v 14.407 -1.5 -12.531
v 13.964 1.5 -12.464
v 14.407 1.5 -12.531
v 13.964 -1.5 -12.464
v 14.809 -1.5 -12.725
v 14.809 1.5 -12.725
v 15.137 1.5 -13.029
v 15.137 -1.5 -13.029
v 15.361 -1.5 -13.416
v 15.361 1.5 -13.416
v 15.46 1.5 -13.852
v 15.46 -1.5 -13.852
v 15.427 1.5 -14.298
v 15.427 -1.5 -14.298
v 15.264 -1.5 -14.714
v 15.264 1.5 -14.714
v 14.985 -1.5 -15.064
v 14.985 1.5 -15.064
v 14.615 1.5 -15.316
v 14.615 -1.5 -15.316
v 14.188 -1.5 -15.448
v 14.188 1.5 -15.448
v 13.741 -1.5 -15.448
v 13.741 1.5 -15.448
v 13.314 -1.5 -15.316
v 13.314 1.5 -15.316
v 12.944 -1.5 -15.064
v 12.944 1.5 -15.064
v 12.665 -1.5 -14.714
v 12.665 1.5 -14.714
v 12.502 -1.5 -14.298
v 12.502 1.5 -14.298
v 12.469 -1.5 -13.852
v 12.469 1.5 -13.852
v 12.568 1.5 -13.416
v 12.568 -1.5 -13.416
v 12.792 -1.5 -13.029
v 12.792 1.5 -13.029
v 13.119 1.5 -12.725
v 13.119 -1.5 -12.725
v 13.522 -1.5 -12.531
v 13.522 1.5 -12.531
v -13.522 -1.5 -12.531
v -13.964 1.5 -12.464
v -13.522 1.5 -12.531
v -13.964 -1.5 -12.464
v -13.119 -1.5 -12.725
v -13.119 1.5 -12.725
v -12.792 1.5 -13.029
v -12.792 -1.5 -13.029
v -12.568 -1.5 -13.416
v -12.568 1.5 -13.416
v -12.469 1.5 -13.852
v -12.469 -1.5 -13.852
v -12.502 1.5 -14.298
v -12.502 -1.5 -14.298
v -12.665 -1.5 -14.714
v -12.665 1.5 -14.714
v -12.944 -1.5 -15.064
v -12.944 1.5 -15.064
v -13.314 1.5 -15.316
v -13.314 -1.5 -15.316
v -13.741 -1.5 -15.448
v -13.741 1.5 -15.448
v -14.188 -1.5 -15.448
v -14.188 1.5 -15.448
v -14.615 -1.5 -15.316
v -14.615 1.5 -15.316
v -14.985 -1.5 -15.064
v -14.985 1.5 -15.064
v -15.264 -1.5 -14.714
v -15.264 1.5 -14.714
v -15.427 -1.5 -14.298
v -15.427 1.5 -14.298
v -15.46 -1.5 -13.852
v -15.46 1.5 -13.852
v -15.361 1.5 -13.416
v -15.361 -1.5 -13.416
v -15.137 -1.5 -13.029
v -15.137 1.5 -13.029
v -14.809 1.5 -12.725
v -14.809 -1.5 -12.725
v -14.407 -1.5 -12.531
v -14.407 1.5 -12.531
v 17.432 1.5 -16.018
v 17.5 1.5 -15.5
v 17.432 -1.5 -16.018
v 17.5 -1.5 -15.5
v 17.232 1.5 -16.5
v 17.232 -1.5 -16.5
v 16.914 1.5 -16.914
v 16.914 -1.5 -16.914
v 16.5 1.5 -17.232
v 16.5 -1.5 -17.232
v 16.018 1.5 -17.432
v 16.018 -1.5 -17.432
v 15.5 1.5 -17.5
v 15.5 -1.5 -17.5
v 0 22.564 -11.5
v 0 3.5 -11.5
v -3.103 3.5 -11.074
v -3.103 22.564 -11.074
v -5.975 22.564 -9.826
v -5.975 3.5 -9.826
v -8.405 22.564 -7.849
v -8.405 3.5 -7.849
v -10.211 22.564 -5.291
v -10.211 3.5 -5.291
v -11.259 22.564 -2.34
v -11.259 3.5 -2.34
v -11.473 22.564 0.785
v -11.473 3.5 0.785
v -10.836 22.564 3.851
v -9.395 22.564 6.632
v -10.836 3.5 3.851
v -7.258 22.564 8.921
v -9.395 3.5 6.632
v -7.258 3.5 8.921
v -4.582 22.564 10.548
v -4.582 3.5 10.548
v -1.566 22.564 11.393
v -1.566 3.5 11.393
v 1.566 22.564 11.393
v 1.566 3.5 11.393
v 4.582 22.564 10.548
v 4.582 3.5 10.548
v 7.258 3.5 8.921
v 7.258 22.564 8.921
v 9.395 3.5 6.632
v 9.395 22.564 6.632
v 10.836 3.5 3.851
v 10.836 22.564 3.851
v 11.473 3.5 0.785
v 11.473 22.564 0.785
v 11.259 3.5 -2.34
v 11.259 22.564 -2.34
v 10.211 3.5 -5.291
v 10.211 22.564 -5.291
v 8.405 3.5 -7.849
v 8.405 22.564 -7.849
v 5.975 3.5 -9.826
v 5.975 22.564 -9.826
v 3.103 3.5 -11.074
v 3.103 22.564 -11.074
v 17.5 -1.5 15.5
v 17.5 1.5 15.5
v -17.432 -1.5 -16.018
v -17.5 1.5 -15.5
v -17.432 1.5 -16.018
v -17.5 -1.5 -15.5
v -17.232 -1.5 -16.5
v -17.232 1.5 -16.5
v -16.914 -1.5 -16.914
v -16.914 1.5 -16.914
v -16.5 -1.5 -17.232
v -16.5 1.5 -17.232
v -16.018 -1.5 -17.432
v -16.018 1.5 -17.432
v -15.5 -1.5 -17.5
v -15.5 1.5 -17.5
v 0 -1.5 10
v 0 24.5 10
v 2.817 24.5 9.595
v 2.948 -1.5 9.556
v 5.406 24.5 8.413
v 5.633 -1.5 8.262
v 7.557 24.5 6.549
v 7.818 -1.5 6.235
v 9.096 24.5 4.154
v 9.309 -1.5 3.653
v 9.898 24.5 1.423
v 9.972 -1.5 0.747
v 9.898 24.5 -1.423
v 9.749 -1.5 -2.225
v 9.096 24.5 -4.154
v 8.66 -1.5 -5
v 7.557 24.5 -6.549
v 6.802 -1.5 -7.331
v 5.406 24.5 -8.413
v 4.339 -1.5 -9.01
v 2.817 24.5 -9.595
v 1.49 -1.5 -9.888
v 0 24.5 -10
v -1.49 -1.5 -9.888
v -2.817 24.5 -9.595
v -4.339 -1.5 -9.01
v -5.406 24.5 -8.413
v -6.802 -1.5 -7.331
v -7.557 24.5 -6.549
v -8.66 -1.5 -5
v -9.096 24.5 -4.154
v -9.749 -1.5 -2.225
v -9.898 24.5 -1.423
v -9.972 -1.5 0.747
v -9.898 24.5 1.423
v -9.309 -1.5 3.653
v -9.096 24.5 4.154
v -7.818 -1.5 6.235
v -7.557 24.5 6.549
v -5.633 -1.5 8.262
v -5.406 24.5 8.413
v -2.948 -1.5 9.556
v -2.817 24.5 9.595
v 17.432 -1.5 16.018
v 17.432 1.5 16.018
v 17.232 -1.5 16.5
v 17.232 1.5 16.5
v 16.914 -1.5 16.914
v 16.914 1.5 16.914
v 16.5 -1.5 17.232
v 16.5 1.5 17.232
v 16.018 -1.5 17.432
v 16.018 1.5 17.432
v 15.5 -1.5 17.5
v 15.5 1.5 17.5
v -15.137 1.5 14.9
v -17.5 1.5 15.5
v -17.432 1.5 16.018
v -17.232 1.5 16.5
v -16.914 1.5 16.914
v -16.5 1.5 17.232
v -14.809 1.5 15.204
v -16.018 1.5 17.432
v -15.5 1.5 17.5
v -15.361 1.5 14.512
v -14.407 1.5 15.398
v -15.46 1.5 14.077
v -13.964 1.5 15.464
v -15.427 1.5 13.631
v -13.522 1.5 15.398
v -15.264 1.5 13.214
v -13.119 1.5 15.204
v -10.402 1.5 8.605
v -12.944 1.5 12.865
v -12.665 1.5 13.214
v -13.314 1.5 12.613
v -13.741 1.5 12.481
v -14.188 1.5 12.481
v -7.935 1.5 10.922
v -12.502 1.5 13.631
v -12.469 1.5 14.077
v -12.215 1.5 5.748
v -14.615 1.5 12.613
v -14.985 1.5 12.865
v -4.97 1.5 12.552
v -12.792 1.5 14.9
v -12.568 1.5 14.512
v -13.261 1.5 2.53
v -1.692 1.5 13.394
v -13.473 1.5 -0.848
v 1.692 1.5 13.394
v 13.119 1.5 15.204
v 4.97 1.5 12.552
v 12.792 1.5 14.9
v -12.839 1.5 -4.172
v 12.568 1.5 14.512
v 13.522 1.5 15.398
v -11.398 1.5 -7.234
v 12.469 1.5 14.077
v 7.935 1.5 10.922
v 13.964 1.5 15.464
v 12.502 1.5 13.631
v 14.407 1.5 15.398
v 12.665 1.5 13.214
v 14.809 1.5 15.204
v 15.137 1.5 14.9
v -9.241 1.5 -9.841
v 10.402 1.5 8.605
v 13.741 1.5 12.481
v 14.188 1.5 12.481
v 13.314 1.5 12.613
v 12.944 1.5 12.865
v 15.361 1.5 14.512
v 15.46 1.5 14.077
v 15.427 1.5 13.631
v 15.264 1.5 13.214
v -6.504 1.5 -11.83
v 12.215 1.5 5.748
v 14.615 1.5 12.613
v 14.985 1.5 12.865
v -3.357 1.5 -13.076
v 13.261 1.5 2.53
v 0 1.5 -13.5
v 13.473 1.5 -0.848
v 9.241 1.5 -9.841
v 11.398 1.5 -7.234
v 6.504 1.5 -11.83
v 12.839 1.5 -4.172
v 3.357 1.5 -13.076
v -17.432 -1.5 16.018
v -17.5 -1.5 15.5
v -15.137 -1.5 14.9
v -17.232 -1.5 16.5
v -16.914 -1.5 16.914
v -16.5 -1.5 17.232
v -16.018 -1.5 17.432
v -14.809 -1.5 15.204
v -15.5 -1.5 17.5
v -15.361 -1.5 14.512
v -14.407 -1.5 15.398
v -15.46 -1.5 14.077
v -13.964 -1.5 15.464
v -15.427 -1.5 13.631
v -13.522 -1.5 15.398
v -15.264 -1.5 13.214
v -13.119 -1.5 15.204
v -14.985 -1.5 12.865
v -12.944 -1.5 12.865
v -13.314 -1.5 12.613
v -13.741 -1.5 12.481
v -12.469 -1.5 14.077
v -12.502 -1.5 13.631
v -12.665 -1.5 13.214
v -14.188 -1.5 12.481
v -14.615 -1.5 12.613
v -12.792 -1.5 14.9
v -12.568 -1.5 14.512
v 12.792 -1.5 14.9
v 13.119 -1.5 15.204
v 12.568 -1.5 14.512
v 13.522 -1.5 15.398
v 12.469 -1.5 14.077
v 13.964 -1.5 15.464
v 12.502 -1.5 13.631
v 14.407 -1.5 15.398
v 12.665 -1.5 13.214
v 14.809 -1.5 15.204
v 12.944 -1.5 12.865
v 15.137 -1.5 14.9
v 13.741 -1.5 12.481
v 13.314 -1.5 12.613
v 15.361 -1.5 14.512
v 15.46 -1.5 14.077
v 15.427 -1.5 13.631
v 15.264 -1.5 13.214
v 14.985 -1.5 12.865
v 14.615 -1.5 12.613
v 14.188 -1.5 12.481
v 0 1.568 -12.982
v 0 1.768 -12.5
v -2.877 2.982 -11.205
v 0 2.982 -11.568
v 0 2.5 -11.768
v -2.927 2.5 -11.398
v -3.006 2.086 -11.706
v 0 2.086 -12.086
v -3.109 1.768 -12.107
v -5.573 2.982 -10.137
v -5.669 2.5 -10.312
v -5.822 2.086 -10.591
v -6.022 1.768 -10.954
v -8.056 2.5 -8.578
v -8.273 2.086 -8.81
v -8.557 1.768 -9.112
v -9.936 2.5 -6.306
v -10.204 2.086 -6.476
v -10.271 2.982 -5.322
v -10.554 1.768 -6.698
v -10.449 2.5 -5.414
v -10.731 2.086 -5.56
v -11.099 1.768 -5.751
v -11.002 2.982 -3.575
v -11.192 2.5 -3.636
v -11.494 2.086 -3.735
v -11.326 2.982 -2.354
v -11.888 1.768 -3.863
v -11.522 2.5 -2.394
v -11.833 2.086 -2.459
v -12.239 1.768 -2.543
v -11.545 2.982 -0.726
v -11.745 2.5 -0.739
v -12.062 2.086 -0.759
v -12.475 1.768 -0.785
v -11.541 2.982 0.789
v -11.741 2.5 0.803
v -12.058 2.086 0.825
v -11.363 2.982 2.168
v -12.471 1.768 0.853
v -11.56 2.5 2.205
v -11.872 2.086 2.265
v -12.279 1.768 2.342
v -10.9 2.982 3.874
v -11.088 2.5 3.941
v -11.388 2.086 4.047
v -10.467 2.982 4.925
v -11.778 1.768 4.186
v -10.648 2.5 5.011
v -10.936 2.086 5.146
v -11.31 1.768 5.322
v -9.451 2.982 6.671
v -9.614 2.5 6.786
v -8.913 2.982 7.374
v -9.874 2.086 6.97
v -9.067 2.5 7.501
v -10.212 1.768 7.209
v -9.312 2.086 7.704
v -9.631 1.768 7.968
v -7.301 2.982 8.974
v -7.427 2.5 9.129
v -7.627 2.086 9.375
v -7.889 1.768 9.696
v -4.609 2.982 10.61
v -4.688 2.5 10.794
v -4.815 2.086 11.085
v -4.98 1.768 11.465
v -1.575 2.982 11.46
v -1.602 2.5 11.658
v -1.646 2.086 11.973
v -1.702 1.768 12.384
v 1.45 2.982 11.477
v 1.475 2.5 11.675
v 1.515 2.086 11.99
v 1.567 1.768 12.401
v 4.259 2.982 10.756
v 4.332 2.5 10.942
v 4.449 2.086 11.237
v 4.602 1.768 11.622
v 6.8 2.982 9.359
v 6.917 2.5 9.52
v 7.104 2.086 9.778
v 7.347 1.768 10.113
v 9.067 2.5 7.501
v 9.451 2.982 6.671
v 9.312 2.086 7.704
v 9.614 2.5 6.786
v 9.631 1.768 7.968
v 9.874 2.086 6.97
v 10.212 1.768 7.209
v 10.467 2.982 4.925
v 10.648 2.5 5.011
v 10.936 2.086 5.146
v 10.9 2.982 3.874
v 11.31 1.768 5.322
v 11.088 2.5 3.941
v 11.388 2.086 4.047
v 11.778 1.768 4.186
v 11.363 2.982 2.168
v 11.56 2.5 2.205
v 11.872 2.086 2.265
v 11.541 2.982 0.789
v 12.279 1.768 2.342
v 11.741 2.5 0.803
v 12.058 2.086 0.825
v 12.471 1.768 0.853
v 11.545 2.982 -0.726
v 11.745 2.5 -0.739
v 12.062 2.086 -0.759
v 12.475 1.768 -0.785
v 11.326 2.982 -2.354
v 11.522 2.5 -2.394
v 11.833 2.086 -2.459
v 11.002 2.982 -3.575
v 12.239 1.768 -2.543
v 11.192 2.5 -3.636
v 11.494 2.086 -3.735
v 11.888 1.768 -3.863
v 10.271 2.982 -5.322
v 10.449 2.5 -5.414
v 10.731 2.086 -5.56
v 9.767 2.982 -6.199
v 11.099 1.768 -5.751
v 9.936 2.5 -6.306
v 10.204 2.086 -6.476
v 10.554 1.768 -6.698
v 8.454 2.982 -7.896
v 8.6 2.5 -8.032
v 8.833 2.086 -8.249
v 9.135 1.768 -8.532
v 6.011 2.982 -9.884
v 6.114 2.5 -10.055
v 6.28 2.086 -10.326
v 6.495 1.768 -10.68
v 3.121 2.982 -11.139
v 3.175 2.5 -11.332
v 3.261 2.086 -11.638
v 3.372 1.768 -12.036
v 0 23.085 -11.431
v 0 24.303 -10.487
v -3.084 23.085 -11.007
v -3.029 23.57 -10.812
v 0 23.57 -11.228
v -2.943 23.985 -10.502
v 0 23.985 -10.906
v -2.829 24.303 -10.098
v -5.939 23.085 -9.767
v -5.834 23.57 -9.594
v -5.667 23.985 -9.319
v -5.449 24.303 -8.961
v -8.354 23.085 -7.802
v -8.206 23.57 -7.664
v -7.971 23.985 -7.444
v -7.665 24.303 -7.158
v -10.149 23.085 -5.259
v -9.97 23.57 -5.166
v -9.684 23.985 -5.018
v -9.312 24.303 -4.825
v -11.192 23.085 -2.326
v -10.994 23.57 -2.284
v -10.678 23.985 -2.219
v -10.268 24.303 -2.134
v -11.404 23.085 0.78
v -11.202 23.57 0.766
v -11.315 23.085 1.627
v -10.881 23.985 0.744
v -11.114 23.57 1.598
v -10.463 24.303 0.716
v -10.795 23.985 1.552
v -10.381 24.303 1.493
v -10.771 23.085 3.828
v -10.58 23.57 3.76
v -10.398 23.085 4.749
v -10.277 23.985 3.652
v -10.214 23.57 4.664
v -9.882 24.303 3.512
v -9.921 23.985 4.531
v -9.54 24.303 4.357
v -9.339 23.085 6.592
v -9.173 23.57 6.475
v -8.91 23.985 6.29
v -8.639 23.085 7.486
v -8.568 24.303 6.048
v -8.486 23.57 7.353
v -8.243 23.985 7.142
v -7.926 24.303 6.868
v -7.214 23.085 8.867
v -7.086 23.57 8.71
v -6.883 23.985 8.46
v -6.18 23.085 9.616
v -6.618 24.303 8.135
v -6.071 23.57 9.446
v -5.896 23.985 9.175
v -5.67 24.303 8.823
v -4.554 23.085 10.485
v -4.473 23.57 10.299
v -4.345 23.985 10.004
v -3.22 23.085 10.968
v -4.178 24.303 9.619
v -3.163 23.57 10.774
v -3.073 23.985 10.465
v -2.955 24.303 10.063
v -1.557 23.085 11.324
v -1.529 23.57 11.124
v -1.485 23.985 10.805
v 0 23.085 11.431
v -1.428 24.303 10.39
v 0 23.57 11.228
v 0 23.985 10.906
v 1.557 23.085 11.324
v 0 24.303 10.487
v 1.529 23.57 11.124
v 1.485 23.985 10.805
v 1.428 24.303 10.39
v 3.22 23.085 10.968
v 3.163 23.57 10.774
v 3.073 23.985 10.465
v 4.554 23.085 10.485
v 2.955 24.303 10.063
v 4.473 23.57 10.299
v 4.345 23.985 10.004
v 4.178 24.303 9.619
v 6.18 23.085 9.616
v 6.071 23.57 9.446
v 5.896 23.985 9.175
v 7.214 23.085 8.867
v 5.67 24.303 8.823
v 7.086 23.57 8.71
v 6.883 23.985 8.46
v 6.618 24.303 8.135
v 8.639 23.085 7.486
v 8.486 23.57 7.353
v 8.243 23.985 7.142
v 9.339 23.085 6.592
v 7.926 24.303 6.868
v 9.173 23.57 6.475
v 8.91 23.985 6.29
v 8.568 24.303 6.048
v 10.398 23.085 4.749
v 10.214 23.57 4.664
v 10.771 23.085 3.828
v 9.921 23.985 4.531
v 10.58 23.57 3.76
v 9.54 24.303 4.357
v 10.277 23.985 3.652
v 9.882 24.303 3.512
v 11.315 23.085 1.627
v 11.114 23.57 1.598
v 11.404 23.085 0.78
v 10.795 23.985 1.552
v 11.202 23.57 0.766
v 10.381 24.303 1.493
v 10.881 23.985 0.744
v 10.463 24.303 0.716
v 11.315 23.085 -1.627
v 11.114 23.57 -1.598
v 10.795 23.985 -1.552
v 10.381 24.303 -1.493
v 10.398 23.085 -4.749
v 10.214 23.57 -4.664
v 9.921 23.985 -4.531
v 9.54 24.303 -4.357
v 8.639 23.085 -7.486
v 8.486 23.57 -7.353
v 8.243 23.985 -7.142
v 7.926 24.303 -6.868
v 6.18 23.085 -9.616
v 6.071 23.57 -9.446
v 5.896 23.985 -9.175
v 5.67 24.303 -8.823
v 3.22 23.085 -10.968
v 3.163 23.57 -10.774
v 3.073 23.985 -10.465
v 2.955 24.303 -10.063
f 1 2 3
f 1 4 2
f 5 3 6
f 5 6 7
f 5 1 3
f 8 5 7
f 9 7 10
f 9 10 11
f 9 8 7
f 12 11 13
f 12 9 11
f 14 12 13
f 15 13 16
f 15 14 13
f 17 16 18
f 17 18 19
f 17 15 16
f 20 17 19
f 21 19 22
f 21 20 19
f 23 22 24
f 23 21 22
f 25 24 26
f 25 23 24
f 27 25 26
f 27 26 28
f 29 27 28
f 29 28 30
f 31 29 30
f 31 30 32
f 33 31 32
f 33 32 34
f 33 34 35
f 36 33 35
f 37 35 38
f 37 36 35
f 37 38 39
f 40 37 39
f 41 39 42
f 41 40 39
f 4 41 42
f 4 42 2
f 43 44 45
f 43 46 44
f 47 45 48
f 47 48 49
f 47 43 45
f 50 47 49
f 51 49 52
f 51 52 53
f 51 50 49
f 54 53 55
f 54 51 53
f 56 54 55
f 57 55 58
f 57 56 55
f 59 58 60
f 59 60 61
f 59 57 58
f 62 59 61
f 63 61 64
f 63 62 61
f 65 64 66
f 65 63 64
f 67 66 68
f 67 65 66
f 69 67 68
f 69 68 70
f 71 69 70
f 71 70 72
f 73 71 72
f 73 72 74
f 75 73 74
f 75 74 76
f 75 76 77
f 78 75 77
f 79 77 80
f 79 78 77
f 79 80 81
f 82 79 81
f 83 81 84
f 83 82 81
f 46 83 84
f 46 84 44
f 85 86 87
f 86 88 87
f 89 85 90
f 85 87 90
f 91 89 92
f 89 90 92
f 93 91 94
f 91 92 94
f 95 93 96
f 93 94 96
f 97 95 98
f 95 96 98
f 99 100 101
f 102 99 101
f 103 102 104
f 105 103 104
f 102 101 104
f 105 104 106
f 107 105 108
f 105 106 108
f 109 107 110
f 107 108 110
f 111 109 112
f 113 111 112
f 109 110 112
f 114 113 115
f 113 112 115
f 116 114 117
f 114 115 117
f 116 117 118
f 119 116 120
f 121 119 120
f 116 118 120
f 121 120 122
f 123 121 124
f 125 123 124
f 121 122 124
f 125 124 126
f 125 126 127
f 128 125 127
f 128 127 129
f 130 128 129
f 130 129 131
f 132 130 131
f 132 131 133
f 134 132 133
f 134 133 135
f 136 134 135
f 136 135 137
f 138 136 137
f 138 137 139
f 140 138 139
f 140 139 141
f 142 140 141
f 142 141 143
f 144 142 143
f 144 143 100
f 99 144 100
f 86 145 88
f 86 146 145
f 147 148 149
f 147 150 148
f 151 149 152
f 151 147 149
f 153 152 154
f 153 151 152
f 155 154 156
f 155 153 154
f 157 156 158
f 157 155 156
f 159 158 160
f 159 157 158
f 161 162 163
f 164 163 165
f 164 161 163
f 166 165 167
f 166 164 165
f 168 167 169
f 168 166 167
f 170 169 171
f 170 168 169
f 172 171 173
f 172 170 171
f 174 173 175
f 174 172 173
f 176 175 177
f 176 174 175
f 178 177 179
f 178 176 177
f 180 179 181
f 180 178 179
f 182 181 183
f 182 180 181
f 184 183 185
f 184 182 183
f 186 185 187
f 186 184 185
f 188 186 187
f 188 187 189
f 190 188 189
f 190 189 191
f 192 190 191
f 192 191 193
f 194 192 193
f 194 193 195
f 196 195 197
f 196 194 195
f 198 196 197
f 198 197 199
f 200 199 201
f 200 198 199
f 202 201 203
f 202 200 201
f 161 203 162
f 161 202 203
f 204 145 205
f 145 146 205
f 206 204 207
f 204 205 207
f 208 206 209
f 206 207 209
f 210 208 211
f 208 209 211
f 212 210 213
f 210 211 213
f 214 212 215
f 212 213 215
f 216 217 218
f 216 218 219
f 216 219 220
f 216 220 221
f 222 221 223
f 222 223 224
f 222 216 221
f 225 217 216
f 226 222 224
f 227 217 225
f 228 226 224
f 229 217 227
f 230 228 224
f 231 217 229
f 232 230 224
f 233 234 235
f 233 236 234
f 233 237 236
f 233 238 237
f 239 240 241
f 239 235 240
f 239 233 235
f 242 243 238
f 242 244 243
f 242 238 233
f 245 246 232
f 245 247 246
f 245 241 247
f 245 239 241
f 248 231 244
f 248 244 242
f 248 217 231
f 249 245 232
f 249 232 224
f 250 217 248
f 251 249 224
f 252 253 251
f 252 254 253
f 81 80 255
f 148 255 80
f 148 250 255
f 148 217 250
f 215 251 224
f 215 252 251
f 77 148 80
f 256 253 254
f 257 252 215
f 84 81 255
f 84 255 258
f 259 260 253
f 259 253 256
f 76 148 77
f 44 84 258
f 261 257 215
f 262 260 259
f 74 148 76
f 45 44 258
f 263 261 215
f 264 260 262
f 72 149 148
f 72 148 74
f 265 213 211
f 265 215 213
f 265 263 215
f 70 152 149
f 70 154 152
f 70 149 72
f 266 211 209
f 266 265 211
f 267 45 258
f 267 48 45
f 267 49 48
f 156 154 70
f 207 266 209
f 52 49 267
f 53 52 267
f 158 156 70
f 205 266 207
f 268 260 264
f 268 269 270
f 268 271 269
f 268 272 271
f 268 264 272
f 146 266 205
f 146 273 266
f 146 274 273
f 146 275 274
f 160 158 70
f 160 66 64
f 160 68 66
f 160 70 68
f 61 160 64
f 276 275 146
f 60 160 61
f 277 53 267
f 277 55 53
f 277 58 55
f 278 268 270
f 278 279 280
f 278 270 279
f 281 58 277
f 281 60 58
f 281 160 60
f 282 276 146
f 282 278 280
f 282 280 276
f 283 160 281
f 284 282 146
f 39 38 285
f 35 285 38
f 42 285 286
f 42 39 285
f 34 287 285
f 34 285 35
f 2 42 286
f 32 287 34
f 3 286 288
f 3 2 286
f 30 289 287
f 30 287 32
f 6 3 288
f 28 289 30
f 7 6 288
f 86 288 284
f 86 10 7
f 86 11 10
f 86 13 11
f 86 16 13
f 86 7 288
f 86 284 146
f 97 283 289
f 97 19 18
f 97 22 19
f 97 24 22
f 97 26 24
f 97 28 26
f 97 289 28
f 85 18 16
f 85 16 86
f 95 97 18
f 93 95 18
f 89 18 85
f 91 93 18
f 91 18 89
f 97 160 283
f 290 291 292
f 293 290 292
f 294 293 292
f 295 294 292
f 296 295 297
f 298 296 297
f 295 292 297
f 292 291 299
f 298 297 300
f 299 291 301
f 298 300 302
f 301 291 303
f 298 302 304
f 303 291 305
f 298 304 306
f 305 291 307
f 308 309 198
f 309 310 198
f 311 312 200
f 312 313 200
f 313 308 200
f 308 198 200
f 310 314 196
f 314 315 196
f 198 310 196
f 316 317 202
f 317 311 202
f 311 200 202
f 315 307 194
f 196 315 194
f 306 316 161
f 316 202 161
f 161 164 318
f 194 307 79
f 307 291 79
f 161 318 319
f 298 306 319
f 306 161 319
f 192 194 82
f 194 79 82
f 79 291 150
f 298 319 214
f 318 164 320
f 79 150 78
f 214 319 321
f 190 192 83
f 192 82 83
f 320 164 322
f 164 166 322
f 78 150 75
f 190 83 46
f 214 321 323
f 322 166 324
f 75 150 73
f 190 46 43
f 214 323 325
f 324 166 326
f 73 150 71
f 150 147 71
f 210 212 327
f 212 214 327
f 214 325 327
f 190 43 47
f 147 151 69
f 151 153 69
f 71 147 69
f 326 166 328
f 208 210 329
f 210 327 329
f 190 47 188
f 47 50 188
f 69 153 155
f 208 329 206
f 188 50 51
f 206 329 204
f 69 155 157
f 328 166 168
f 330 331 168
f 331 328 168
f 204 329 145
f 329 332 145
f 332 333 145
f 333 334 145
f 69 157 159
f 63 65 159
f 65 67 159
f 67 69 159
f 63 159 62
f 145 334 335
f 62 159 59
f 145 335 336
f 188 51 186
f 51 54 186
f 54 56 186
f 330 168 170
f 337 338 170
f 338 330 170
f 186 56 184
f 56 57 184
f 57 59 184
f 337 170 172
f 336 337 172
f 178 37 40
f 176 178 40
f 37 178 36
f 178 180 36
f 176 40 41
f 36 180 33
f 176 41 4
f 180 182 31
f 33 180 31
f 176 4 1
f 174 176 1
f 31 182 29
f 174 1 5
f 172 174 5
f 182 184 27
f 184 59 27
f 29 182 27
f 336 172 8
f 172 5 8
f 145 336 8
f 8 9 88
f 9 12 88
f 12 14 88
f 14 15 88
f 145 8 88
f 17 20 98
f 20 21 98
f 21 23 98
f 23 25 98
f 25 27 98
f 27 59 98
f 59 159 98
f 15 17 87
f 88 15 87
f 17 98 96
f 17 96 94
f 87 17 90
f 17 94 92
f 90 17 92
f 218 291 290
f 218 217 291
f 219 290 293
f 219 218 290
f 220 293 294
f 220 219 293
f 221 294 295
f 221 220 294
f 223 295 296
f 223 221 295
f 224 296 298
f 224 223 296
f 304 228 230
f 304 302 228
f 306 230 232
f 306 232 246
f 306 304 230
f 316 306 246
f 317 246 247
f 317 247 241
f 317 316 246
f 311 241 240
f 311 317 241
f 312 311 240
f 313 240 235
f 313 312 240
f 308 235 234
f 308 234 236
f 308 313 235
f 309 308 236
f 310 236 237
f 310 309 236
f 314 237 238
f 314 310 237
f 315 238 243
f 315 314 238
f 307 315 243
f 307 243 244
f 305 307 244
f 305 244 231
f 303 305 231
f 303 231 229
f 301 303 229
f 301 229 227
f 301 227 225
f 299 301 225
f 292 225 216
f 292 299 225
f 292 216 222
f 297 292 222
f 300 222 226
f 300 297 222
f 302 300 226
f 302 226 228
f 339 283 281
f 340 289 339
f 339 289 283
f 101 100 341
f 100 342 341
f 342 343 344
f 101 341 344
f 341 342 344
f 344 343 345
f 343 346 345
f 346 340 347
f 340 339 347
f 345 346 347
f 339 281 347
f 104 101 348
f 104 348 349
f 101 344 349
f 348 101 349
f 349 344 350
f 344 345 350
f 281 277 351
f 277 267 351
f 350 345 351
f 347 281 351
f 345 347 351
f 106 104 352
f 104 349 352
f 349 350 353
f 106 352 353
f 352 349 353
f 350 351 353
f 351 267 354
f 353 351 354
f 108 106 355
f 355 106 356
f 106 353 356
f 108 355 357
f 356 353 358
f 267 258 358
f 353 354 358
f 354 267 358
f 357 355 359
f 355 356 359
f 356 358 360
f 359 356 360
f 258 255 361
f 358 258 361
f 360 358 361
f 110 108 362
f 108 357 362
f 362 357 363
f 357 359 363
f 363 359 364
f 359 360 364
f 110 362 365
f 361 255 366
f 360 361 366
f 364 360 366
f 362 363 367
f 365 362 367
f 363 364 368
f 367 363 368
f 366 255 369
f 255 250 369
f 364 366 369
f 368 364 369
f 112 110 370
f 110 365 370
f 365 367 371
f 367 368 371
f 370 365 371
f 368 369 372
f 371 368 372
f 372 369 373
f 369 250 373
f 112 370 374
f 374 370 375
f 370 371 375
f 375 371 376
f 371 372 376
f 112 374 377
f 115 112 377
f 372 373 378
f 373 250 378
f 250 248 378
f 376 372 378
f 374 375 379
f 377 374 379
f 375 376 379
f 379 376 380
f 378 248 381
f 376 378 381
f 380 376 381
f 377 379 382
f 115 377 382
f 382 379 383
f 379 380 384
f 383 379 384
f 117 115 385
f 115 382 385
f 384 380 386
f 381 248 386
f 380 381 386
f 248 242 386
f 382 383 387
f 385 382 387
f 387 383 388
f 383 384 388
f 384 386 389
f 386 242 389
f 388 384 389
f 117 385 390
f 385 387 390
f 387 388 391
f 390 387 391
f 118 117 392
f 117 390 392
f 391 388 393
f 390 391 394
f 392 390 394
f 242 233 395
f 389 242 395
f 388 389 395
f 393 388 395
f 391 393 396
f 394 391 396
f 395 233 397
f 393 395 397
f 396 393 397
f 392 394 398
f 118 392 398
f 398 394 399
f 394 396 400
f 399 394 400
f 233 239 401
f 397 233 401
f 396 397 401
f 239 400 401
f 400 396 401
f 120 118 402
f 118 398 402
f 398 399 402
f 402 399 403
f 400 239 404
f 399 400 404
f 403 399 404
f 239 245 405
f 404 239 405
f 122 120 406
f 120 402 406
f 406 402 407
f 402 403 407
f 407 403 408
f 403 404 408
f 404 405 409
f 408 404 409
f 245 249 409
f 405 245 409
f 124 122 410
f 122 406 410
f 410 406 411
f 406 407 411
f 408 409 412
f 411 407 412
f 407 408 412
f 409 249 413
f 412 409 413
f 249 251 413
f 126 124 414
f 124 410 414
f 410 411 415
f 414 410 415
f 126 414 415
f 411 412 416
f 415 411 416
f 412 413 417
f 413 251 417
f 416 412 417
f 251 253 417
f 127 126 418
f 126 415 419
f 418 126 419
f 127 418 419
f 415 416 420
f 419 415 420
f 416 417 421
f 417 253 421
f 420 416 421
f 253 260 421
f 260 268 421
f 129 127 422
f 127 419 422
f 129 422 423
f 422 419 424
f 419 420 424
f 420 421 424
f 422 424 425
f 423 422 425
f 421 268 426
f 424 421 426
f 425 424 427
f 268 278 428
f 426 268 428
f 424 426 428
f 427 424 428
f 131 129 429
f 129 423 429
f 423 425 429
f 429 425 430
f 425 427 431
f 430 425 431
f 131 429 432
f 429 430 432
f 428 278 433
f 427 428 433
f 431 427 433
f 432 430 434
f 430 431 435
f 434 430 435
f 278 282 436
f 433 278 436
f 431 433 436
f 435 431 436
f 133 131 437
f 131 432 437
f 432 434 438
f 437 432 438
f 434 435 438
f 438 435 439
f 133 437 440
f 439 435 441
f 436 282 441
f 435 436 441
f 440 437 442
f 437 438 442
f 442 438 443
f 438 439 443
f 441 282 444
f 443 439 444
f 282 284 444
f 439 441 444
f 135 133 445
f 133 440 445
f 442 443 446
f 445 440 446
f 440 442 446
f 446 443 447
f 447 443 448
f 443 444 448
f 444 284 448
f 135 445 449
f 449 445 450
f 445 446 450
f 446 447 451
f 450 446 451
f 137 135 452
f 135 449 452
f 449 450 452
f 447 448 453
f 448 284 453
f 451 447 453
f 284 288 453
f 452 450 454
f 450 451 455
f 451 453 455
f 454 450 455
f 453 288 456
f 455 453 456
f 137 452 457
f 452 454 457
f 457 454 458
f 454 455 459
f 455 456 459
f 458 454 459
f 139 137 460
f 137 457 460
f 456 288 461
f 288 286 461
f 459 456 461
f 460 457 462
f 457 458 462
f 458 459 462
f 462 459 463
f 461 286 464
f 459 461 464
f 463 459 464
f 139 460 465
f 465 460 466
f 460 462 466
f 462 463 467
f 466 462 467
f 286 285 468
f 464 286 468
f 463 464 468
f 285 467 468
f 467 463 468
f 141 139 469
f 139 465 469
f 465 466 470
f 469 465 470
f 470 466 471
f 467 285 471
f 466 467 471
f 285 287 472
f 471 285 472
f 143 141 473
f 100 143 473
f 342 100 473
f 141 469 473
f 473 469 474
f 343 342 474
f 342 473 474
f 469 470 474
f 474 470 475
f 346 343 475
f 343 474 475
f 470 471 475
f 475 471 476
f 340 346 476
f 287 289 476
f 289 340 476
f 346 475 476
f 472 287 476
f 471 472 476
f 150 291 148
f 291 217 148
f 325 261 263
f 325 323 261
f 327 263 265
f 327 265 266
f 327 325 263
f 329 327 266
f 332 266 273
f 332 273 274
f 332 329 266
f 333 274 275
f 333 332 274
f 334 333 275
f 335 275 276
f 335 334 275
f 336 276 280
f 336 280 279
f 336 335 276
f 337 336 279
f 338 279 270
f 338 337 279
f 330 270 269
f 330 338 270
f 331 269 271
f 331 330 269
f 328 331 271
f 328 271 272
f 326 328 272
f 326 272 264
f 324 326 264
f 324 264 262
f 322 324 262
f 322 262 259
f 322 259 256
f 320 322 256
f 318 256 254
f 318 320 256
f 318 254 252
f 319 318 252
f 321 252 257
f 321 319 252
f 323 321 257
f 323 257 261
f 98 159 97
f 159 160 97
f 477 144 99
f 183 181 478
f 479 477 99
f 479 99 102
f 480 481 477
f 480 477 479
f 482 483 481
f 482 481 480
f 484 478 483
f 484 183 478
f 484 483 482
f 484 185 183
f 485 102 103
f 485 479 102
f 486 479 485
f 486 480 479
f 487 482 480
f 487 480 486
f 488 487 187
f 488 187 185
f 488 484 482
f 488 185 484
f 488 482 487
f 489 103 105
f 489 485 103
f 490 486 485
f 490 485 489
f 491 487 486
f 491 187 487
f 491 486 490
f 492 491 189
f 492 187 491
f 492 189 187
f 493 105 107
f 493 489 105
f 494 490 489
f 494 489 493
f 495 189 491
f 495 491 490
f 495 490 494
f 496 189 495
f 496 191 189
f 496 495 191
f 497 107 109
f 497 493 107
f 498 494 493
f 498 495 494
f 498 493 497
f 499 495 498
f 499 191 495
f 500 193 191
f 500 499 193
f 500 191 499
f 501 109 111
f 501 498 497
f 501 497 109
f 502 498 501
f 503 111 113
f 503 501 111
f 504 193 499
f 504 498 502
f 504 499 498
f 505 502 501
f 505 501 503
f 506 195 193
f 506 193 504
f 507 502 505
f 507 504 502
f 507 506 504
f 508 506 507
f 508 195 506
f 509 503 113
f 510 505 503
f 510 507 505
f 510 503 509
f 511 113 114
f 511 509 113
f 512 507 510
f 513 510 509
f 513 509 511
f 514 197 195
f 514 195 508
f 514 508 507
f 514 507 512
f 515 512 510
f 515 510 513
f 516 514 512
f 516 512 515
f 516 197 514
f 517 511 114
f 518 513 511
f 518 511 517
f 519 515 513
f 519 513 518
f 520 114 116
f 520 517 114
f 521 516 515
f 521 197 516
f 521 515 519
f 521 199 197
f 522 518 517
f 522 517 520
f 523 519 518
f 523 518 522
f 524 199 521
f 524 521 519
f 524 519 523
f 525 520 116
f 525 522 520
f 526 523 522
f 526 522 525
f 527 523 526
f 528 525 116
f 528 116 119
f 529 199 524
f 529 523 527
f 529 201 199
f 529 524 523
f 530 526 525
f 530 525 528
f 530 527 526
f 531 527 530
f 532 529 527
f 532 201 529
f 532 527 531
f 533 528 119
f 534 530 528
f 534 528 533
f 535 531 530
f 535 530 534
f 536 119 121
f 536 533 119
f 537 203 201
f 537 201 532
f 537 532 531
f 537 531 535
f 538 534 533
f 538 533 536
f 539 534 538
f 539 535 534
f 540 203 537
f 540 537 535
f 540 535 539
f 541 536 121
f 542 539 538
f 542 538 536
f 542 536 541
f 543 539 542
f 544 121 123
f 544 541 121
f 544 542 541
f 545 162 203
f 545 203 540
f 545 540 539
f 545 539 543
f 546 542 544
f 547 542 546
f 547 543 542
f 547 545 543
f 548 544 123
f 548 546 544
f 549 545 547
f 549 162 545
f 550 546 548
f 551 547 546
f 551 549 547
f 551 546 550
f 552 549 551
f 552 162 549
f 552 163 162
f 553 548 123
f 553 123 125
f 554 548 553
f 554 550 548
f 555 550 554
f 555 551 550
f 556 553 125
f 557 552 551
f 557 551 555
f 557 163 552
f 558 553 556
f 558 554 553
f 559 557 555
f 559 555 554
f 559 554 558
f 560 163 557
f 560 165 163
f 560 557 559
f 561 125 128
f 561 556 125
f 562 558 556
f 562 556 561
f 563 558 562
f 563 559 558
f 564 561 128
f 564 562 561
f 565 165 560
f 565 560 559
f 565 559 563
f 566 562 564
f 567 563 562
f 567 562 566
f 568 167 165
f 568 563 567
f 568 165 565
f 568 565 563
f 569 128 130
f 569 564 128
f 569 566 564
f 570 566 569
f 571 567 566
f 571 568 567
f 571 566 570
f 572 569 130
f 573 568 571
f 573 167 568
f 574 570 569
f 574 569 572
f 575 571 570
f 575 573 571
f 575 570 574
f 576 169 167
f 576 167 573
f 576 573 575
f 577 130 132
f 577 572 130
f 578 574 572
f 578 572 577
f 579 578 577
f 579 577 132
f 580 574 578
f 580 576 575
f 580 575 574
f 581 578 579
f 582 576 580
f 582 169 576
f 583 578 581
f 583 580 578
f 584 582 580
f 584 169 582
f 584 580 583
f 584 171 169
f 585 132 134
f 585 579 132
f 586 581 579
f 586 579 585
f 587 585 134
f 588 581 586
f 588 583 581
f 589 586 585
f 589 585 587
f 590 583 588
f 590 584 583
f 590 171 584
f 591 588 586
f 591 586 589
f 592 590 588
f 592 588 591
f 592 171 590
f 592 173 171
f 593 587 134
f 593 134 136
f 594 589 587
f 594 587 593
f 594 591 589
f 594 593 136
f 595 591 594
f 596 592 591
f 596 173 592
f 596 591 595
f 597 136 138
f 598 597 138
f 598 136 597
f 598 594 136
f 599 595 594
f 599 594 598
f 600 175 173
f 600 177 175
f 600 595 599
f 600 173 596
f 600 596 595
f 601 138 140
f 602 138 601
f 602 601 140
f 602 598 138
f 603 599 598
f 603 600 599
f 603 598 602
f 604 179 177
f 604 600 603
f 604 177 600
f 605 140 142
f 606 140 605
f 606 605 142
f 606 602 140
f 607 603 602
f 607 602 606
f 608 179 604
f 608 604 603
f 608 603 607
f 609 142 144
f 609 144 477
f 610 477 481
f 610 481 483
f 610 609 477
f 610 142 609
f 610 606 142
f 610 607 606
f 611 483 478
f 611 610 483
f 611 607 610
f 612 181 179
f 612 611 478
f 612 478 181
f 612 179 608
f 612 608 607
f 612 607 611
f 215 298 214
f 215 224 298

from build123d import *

# Parameters (mm, degrees)
ESBO_O1_W                = 35
ESBO_O1_H                = 35
ESBO_O1_R                = 10
ESBO_O1_R_2              = 1.5
RESSALTO_EXTRUS_O1_DEPTH = 1.5
FILETE1_R                = 2
ESBO_O2_R                = 11.5
ESBO_O2_R_2              = 10
RESSALTO_EXTRUS_O2_DEPTH = 23
FILETE2_R                = 2


with BuildPart() as part:
    # Esboço1 → Ressalto-extrusão1 (new, symmetric)
    with BuildSketch(Plane(origin=(0, 0, 0), x_dir=(1, 0, 0), z_dir=(0, 1, 0))):
        Rectangle(ESBO_O1_W, ESBO_O1_H)
        with Locations(Location((0, 0, 0), (0, 0, 270))):
            Circle(ESBO_O1_R, mode=Mode.SUBTRACT)
        with Locations(Location((-13.964466094, 13.964466094, 0), (0, 0, 270))):
            Circle(ESBO_O1_R_2, mode=Mode.SUBTRACT)
        with Locations(Location((13.964466094, 13.964466094, 0), (0, 0, 270))):
            Circle(ESBO_O1_R_2, mode=Mode.SUBTRACT)
        with Locations(Location((13.964466094, -13.964466094, 0), (0, 0, 270))):
            Circle(ESBO_O1_R_2, mode=Mode.SUBTRACT)
        with Locations(Location((-13.964466094, -13.964466094, 0), (0, 0, 270))):
            Circle(ESBO_O1_R_2, mode=Mode.SUBTRACT)
    extrude(amount=RESSALTO_EXTRUS_O1_DEPTH, both=True)

    # Filete1
    filete1_edges = [part.edges().sort_by_distance(p)[0] for p in [
        (17.5, 0, 17.5),
        (-17.5, 0, 17.5),
        (-17.5, 0, -17.5),
        (17.5, 0, -17.5),
    ]]
    fillet(filete1_edges, radius=FILETE1_R)

    # Esboço2 → Ressalto-extrusão2 (add)
    with BuildSketch(Plane(origin=(0, 1.5, 0), x_dir=(1, 0, 0), z_dir=(0, 1, 0))):
        with Locations(Location((0, 0, 0), (0, 0, 90))):
            Circle(ESBO_O2_R)
        with Locations(Location((0, 0, 0), (0, 0, 270))):
            Circle(ESBO_O2_R_2, mode=Mode.SUBTRACT)
    extrude(amount=RESSALTO_EXTRUS_O2_DEPTH)

    # Filete2
    # the kernel refuses this fillet: 2 mm, written as the material it adds along each edge
    with BuildSketch(Plane(origin=(0, 1.5, 0), x_dir=(0, 0, -1), z_dir=(1, 0, 0))) as filete2_piece_1:
        with BuildLine():
            CenterArc((11.5 + FILETE2_R, FILETE2_R), FILETE2_R, 180, 90)
            Line((11.5, FILETE2_R), (11.5, 0))
            Line((11.5, 0), (11.5 + FILETE2_R, 0))
        make_face()
    revolve(axis=Axis((0, 1.5, 0), (0, 1, 0)))
    # the kernel refuses this fillet: 2 mm, written as the material it takes off along each edge
    with BuildSketch(Plane(origin=(0, 24.5, 0), x_dir=(0, 0, -1), z_dir=(1, 0, 0))) as filete2_2_piece_1:
        with BuildLine():
            CenterArc((9.5, -1.936491673), FILETE2_R, 0, 75.522487814)
            Line((11.5, -1.936491673), (11.5, 0))
            Line((11.5, 0), (10, 0))
        make_face()
    revolve(axis=Axis((0, 24.5, 0), (0, 1, 0)), mode=Mode.SUBTRACT)


solid = part.part
